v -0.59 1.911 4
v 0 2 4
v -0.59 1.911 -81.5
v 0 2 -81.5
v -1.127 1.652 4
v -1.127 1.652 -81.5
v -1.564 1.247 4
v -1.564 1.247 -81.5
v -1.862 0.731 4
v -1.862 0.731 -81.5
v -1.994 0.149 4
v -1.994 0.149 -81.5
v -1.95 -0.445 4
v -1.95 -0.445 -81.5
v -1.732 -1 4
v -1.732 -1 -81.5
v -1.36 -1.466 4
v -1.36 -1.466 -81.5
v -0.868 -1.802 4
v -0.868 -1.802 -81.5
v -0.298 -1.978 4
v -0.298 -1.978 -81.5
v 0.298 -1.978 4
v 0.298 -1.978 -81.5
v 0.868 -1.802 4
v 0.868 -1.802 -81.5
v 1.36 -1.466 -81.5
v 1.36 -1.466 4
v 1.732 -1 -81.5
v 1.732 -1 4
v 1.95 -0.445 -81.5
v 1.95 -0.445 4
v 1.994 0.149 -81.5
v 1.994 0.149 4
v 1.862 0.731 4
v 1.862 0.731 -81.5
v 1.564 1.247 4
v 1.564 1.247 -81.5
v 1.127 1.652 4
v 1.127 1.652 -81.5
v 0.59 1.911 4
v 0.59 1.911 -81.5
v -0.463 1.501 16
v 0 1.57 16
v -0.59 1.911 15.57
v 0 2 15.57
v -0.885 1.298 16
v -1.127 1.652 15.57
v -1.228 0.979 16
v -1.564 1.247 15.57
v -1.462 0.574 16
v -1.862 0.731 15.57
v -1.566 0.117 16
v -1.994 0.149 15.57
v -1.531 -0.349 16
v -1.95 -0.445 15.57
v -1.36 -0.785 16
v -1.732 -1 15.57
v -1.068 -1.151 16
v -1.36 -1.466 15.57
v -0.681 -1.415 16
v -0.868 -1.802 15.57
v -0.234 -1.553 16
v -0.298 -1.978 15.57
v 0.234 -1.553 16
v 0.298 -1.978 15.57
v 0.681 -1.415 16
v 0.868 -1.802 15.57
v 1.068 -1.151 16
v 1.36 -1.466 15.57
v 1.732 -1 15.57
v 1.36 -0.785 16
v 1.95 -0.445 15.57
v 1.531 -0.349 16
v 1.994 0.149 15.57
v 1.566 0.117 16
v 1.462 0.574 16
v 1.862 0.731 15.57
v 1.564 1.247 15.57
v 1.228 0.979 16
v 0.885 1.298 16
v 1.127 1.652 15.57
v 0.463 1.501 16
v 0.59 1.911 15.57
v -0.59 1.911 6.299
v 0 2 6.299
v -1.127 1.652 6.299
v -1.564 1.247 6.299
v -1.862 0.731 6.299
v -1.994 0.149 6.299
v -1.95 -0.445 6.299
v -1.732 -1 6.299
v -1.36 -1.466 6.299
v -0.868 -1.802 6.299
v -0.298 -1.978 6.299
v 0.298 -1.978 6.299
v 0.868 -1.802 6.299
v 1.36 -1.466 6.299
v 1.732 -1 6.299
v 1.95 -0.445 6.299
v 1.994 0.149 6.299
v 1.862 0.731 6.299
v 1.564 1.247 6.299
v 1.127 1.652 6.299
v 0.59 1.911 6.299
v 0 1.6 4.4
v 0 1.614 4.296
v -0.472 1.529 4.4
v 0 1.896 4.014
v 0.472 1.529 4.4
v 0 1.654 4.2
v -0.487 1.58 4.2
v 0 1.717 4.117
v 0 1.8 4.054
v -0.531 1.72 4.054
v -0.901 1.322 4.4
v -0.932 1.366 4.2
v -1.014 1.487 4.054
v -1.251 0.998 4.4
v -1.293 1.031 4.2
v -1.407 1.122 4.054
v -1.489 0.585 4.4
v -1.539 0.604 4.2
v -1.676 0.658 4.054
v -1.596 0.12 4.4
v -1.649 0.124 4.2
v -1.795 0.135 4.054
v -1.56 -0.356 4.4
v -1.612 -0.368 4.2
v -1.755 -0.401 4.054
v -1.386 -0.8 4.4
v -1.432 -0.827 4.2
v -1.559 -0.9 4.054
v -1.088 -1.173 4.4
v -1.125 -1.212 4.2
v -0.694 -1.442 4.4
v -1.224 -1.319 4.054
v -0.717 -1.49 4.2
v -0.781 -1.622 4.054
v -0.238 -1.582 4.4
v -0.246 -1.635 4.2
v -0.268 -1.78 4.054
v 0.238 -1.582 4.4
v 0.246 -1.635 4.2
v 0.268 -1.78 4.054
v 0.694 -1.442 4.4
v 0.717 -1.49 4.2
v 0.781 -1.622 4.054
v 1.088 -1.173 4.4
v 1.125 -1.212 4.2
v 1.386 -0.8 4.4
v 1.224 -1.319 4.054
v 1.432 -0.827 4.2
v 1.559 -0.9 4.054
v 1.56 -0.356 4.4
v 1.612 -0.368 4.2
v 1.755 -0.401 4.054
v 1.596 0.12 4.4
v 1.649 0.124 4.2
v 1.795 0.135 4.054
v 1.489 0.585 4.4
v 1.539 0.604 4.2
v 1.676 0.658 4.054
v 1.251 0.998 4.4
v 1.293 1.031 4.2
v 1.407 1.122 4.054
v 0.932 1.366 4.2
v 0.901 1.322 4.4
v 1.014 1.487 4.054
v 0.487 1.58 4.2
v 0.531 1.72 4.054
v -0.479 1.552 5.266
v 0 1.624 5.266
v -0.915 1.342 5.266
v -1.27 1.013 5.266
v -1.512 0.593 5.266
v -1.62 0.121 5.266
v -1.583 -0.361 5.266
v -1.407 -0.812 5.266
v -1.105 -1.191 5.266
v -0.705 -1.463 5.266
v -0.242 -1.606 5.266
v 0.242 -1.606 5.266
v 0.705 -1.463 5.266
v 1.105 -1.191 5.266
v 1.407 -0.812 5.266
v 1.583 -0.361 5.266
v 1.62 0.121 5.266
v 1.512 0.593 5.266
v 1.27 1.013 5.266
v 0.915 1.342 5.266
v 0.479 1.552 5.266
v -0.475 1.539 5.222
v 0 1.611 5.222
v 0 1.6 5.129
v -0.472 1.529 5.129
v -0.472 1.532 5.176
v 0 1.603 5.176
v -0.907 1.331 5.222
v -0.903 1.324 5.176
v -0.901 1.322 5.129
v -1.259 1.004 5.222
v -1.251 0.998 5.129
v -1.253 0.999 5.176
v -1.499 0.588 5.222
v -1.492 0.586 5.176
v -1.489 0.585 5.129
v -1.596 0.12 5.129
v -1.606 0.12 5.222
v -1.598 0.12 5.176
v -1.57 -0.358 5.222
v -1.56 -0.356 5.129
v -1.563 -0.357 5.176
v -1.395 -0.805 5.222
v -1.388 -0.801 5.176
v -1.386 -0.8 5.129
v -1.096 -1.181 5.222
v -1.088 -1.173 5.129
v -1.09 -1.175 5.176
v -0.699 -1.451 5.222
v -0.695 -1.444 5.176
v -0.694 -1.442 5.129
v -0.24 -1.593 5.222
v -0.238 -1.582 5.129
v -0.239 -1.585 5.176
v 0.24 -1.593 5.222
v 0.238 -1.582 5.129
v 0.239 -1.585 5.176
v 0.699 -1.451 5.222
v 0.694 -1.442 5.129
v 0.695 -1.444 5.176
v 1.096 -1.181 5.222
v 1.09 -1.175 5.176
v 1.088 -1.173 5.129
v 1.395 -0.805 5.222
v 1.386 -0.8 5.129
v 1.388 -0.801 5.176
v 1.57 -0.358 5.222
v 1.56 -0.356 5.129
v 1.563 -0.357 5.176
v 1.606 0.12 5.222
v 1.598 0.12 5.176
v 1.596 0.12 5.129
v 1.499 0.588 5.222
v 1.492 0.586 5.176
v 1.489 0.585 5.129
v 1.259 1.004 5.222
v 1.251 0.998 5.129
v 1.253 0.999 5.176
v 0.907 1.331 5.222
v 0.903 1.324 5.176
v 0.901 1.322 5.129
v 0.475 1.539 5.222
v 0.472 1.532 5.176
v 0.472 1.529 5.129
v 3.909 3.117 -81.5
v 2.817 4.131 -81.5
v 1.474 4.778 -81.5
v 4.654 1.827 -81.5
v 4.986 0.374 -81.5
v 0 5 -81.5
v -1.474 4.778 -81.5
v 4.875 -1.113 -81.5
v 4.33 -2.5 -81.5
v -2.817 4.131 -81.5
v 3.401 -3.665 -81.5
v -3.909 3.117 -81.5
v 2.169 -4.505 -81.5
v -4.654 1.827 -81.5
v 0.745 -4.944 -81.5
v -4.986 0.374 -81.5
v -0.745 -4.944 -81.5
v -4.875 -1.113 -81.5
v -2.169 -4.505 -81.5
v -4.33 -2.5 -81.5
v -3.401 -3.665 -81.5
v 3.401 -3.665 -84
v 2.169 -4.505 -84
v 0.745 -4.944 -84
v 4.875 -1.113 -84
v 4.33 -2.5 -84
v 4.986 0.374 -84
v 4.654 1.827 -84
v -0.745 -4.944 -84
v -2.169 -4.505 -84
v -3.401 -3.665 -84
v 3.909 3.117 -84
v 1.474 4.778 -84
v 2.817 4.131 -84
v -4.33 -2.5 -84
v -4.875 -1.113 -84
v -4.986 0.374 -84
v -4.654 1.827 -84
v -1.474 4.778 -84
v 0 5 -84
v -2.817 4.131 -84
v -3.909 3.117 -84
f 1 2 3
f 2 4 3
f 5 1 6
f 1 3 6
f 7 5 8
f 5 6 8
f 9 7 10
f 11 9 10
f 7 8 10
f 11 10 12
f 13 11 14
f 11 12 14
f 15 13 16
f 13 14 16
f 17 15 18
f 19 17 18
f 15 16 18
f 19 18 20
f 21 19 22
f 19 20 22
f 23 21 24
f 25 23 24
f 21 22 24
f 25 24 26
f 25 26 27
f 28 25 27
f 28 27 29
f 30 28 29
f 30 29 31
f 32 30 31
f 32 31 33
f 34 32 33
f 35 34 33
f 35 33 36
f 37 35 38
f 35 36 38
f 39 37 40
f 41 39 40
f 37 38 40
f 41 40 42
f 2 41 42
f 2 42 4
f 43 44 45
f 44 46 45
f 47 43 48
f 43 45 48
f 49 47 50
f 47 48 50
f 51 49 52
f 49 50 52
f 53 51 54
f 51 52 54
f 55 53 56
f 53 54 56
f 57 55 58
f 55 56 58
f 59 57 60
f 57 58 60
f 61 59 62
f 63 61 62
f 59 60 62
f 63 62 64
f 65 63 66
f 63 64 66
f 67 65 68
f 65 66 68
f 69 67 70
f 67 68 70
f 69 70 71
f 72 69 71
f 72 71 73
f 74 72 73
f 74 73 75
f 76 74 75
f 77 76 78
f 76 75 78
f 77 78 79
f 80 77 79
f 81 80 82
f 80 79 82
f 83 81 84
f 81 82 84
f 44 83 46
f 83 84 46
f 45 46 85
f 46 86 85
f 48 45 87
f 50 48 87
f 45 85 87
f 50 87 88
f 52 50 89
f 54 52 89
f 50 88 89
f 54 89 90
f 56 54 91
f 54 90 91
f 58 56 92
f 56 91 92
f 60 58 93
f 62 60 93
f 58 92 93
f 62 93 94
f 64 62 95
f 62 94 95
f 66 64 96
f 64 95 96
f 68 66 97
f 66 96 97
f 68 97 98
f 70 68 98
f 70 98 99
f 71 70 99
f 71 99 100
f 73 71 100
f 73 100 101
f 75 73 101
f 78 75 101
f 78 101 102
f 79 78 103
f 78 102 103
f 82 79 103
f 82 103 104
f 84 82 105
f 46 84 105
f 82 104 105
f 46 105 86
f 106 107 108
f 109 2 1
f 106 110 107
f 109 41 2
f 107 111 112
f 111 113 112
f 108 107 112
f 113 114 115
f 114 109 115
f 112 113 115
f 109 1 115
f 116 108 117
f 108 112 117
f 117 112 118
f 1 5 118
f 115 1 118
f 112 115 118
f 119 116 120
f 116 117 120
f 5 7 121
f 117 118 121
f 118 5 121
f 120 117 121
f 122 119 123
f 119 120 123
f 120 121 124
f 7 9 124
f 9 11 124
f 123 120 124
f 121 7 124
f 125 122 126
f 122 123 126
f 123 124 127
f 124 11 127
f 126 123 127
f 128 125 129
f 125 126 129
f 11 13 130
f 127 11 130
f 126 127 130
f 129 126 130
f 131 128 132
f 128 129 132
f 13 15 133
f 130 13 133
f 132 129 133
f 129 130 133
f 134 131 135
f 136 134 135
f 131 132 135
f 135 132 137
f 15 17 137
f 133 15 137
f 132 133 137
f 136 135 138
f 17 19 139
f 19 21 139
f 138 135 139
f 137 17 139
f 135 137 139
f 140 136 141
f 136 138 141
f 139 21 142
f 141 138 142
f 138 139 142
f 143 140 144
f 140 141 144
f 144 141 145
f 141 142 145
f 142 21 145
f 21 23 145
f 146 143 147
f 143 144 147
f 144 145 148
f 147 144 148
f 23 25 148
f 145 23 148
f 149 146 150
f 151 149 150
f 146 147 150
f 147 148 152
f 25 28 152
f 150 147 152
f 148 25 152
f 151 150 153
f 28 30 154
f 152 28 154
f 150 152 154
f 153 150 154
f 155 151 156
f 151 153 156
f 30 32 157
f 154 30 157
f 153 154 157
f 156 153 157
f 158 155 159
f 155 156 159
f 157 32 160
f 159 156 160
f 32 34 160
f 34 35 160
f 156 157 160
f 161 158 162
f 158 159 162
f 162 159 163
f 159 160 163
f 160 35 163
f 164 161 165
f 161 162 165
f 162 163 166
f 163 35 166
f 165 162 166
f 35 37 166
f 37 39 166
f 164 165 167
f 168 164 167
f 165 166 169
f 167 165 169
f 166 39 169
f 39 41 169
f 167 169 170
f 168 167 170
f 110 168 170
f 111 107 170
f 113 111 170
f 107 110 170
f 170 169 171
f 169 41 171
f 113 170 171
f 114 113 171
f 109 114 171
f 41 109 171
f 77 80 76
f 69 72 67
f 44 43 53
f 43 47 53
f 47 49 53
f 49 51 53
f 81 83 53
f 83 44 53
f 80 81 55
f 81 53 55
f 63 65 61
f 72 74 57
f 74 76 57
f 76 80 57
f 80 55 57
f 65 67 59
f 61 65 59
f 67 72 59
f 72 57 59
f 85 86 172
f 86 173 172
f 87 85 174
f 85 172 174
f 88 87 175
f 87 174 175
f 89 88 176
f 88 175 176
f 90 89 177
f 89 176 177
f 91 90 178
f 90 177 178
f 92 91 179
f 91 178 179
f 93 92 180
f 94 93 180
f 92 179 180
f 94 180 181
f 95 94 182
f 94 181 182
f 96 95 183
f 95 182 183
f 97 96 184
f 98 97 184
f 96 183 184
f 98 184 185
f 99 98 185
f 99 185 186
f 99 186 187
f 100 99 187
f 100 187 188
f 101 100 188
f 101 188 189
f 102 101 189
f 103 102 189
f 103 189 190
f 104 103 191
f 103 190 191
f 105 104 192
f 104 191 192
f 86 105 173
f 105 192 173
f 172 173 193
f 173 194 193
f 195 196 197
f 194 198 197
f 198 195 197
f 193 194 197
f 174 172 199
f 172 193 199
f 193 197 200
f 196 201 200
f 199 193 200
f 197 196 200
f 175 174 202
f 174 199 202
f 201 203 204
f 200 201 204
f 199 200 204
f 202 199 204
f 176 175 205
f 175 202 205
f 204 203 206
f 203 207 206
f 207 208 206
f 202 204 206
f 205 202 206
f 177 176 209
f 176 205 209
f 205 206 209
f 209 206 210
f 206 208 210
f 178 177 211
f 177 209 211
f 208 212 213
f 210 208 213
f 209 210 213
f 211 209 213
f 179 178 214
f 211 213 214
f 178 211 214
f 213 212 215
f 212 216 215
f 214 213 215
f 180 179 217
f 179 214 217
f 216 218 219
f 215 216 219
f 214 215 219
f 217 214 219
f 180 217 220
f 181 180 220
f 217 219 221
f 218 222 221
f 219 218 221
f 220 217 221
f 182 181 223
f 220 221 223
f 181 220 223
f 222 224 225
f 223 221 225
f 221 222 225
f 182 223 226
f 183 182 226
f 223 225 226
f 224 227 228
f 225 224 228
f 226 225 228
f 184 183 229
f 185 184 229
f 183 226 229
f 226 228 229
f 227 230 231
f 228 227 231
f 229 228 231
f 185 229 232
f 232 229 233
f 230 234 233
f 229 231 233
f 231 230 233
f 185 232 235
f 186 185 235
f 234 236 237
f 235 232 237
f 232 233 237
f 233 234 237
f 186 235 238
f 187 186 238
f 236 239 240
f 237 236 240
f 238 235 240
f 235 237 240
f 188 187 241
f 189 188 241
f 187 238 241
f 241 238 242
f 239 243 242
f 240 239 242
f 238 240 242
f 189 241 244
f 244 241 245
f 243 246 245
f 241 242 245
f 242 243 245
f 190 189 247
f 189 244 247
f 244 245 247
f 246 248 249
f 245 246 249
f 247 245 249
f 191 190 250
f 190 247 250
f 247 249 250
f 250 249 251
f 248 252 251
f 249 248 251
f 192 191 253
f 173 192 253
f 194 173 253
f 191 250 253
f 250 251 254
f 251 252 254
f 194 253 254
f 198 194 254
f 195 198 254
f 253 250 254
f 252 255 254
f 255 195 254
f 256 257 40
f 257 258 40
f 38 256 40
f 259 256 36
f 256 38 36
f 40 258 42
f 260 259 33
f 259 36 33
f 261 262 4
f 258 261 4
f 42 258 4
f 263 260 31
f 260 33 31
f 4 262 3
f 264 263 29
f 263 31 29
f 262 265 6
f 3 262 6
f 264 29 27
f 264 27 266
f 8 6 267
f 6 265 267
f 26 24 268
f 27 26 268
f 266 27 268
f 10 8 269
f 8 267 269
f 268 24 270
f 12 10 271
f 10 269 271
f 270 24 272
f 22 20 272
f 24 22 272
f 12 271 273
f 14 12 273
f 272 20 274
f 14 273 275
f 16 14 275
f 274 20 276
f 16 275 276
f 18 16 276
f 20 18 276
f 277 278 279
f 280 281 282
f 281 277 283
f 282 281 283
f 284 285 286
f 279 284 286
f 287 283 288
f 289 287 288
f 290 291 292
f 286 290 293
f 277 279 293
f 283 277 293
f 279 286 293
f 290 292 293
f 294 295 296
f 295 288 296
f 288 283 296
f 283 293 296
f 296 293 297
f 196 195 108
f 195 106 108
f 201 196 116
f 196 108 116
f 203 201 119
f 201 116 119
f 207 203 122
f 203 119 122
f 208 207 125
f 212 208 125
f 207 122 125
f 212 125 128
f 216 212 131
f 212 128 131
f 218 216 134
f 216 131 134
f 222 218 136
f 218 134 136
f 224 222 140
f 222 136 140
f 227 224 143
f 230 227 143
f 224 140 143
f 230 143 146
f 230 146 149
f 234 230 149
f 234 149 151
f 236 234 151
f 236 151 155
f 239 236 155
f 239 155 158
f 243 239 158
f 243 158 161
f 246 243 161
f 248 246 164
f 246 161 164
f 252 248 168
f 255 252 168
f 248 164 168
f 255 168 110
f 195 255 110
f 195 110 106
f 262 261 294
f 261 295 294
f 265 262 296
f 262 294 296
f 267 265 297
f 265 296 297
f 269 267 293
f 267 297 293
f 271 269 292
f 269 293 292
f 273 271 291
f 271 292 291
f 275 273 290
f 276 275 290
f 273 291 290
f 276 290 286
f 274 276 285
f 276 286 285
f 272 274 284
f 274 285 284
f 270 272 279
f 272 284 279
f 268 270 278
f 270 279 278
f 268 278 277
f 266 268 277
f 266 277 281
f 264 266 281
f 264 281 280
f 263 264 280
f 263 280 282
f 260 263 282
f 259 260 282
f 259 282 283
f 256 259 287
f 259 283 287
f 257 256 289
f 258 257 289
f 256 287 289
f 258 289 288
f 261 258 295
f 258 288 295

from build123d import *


with BuildPart() as part:
    # Sketch1 → Revolve1 (revolve)
    with BuildSketch(Plane(origin=(0, 0, 0), x_dir=(0, 0, -1), z_dir=(1, 0, 0))):
        Polygon((-4, 0), (-4, 2), (81.5, 2), (81.5, 5), (84, 5), (84, 0), align=None)
    revolve(axis=Axis((0, 0, -84), (0, 0, 1)))

    # Sketch2 → Revolve2 (revolve)
    with BuildSketch(Plane(origin=(0, 0, 0), x_dir=(0, 0, -1), z_dir=(1, 0, 0))):
        with BuildLine():
            Line((-16, 0), (-16, 1.5705))
            Line((-16, 1.5705), (-15.5705, 2))
            Line((-15.5705, 2), (-6.298990968, 2))
            Line((-6.298990968, 2), (-5.266277265, 1.624122952))
            ThreePointArc((-5.266277265, 1.624122952), (-5.198928479, 1.606076899), (-5.129469208, 1.6))
            Line((-5.129469208, 1.6), (-4.4, 1.6))
            ThreePointArc((-4.4, 1.6), (-4.117157288, 1.717157288), (-4, 2))
            Line((-4, 2), (-3, 2))
            Line((-3, 2), (-3, 0))
            Line((-3, 0), (-16, 0))
        make_face()
    revolve(axis=Axis((0, 0, 3), (0, 0, 1)))


solid = part.part
